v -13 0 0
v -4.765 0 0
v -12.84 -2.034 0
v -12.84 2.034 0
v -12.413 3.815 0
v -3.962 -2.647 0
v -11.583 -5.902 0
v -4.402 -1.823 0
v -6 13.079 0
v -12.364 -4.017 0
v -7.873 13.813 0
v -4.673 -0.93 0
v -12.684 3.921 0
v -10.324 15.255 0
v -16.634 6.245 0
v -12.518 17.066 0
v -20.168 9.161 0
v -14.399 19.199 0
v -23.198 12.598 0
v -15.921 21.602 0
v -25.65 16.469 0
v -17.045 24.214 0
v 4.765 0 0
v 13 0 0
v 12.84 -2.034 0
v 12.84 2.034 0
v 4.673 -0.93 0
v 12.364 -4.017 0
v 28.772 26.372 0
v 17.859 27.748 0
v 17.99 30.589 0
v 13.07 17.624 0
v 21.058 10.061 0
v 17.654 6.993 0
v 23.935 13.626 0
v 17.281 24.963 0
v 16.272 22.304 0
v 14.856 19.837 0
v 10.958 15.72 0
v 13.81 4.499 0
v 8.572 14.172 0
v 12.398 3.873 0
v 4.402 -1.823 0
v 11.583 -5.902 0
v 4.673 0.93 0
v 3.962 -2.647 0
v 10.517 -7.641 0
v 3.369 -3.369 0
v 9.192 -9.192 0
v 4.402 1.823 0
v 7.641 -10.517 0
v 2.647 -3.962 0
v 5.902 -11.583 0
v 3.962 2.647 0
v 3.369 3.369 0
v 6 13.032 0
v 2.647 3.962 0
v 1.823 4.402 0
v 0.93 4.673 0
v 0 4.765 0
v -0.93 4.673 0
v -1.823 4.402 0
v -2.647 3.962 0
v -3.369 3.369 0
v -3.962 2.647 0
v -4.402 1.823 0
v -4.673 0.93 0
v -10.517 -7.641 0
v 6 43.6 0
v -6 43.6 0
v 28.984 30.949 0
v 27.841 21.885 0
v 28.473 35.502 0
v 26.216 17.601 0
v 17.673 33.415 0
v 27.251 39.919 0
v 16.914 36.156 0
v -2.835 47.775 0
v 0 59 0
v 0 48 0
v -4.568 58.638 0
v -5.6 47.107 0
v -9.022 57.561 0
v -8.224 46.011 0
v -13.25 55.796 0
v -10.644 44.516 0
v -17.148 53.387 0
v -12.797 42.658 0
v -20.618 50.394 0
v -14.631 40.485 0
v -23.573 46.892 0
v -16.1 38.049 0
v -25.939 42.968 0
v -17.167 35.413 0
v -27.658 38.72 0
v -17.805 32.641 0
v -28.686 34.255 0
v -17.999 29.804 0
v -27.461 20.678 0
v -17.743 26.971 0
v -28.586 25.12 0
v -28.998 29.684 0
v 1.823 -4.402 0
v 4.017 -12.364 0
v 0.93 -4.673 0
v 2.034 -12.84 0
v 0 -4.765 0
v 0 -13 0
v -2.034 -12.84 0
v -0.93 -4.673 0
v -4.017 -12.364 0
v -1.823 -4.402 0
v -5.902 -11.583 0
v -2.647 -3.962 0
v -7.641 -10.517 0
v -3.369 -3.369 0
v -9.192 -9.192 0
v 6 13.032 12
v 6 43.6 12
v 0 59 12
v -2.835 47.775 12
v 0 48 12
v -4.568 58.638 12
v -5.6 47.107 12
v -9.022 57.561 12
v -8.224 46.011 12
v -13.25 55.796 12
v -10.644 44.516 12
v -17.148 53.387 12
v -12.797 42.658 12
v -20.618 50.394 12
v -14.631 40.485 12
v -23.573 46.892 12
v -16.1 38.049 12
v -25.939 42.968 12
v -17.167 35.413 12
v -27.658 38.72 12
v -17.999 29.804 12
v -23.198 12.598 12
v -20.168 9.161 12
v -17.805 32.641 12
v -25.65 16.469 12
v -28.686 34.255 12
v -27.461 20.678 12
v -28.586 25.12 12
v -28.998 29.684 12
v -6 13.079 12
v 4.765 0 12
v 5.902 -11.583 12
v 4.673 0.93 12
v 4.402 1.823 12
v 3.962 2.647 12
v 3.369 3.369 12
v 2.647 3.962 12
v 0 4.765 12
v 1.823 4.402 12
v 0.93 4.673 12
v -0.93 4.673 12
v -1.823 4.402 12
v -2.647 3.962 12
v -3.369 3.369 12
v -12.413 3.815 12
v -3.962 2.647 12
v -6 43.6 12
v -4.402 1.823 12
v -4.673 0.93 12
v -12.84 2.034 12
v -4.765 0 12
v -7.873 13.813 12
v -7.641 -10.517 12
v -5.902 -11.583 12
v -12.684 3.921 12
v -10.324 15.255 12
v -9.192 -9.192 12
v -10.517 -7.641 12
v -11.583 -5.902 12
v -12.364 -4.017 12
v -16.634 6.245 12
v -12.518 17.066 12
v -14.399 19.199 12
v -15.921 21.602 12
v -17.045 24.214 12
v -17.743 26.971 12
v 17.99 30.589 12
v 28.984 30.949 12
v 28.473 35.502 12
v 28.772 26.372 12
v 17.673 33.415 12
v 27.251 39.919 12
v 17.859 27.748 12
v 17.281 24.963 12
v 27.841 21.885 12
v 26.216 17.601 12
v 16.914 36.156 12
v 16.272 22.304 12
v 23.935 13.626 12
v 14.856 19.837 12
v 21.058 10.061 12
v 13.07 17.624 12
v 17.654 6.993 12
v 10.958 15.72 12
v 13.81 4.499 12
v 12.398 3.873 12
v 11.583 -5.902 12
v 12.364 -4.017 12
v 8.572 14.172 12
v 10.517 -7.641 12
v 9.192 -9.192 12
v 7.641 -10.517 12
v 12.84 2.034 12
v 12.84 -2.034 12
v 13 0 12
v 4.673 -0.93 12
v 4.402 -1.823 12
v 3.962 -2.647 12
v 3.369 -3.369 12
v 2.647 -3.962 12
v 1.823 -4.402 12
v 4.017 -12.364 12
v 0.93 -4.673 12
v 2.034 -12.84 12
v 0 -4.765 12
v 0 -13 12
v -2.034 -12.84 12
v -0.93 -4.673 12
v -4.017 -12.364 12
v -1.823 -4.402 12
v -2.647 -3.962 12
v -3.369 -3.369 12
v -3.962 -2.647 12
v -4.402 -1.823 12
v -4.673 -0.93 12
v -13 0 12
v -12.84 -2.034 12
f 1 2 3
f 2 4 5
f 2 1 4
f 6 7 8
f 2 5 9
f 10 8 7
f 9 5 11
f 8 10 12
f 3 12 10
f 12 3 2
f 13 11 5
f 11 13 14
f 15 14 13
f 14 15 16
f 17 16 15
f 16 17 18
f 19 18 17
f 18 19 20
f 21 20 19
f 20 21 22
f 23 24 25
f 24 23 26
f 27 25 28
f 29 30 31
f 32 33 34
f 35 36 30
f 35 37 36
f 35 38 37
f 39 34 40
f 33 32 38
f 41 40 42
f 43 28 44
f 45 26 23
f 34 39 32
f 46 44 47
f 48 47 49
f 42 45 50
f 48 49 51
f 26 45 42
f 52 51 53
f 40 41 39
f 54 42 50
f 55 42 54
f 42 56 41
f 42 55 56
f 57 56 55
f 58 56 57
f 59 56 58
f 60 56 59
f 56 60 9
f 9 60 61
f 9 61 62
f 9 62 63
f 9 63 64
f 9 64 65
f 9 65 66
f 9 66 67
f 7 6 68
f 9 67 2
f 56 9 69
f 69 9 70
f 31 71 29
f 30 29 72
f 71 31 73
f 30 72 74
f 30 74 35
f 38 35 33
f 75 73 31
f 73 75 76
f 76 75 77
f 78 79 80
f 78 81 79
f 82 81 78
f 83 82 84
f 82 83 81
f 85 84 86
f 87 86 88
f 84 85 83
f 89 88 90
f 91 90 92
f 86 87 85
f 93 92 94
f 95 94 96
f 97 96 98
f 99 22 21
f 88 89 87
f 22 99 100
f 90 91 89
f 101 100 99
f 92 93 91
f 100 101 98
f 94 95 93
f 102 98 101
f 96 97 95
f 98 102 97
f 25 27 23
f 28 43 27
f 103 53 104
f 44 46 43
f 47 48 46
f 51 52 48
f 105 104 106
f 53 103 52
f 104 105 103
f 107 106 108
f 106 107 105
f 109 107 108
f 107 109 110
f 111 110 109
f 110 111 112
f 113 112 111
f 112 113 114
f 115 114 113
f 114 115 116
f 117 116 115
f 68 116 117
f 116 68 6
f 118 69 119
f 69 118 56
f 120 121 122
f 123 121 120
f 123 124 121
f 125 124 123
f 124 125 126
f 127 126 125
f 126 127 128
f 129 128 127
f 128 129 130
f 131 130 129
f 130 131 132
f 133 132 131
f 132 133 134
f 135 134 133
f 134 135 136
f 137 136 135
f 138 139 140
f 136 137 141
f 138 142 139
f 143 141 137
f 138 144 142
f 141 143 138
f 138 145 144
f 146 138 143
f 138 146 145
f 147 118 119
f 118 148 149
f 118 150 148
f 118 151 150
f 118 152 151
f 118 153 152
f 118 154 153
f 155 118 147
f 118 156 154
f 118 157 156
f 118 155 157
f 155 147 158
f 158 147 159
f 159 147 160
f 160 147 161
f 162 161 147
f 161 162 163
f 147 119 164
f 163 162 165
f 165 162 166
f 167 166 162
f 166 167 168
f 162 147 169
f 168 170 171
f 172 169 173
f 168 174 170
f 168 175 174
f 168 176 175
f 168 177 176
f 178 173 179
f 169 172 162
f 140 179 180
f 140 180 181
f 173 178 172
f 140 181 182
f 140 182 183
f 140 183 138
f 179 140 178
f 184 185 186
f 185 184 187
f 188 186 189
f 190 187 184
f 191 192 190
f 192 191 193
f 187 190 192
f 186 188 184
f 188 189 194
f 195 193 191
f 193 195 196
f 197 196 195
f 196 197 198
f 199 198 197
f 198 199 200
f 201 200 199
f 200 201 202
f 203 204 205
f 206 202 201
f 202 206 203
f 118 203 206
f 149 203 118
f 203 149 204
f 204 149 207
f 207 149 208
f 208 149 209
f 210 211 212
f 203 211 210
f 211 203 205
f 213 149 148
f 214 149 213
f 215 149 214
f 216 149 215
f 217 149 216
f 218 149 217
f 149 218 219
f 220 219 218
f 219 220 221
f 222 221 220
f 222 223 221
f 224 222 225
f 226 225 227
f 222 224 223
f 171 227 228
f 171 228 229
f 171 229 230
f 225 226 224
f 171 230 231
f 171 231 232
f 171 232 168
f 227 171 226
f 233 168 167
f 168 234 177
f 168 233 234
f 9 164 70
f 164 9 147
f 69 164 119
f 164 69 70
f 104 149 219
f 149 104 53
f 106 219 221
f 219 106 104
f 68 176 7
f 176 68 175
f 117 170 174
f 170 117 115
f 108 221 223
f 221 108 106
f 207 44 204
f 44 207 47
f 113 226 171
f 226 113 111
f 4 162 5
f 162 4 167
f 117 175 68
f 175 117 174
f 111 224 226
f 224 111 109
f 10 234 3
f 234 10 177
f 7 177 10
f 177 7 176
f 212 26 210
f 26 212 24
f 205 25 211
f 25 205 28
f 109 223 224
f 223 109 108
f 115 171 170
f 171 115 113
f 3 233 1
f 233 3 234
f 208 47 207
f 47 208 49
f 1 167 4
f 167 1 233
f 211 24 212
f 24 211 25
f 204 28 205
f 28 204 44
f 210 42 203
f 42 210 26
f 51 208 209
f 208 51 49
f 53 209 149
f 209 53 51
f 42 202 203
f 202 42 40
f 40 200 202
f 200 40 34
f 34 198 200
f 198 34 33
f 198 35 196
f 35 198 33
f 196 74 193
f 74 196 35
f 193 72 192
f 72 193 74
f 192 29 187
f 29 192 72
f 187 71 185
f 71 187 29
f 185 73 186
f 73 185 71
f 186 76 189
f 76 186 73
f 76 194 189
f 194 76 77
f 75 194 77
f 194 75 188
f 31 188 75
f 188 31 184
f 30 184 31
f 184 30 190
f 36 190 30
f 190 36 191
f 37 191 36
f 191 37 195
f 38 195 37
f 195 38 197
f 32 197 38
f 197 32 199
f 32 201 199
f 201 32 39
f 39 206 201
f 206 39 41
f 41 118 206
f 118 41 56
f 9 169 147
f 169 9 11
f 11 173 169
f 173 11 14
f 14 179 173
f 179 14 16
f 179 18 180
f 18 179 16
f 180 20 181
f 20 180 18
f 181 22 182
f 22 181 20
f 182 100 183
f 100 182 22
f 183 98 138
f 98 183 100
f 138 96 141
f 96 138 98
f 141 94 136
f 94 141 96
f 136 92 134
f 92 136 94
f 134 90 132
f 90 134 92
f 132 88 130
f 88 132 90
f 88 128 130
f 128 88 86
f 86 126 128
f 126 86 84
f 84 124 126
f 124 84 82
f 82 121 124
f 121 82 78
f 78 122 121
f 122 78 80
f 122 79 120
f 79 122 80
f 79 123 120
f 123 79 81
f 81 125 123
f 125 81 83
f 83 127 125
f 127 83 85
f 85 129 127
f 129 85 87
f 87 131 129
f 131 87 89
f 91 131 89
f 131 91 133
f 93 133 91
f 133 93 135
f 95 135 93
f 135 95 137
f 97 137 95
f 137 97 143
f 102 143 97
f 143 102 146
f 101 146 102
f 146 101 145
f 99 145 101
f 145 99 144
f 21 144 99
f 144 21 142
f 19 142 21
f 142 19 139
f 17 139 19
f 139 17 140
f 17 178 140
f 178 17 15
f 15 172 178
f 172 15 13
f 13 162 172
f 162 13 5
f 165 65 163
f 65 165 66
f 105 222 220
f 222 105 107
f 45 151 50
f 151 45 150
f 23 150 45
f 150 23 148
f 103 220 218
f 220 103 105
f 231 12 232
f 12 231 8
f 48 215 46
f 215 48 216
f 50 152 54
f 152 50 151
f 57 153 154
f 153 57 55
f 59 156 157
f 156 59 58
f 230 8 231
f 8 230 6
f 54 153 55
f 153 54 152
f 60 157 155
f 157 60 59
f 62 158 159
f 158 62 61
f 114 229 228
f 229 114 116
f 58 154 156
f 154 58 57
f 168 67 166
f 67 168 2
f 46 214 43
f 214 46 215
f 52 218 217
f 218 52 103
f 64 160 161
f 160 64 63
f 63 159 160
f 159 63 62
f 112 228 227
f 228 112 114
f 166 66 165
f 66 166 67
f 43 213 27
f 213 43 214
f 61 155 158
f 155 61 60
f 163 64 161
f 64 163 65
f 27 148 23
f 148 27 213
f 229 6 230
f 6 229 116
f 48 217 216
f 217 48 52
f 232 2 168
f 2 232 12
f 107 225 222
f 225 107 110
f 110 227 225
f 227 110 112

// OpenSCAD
$fn = 32;

// ----------------------------------------------------------------------
// Hook: 60 mm shank into a 18 mm curl, 12 mm thick
// ----------------------------------------------------------------------

// --- parameters (mm) ---
shank_len = 60;           // shank length from the boss centre
shank_w = 12;             // shank width
boss_d = 26;              // boss diameter
bore_d = 9.53;            // boss bore
curl_in = 18;             // curl inner radius
curl_out = 29;            // curl outer radius
curl_sweep = 290;         // curl sweep angle
hook_t = 12;              // hook thickness

shank_profile = [[-6, 43.6], [6, 43.6], [6, 11], [-6, 11]];
boss_profile = [[13, 0], [12.84, 2.034], [12.364, 4.017], [11.583, 5.902], [10.517, 7.641], [9.192, 9.192], [7.641, 10.517], [5.902, 11.583], [4.017, 12.364], [2.034, 12.84], [0, 13], [-2.034, 12.84], [-4.017, 12.364], [-5.902, 11.583], [-7.641, 10.517], [-9.192, 9.192], [-10.517, 7.641], [-11.583, 5.902], [-12.364, 4.017], [-12.84, 2.034], [-13, 0], [-12.84, -2.034], [-12.364, -4.017], [-11.583, -5.902], [-10.517, -7.641], [-9.192, -9.192], [-7.641, -10.517], [-5.902, -11.583], [-4.017, -12.364], [-2.034, -12.84], [0, -13], [2.034, -12.84], [4.017, -12.364], [5.902, -11.583], [7.641, -10.517], [9.192, -9.192], [10.517, -7.641], [11.583, -5.902], [12.364, -4.017], [12.84, -2.034]];
curl_profile = [[0, 59], [-4.568, 58.638], [-9.022, 57.561], [-13.25, 55.796], [-17.148, 53.387], [-20.618, 50.394], [-23.573, 46.892], [-25.939, 42.968], [-27.658, 38.72], [-28.686, 34.255], [-28.998, 29.684], [-28.586, 25.12], [-27.461, 20.678], [-25.65, 16.469], [-23.198, 12.598], [-20.168, 9.161], [-16.634, 6.245], [-12.684, 3.921], [-8.418, 2.249], [-3.942, 1.269], [0.633, 1.007], [5.191, 1.468], [9.621, 2.642], [13.81, 4.499], [17.654, 6.993], [21.058, 10.061], [23.935, 13.626], [26.216, 17.601], [27.841, 21.885], [28.772, 26.372], [28.984, 30.949], [28.473, 35.502], [27.251, 39.919], [16.914, 36.156], [17.673, 33.415], [17.99, 30.589], [17.859, 27.748], [17.281, 24.963], [16.272, 22.304], [14.856, 19.837], [13.07, 17.624], [10.958, 15.72], [8.572, 14.172], [5.971, 13.019], [3.222, 12.291], [0.393, 12.004], [-2.447, 12.167], [-5.225, 12.775], [-7.873, 13.813], [-10.324, 15.255], [-12.518, 17.066], [-14.399, 19.199], [-15.921, 21.602], [-17.045, 24.214], [-17.743, 26.971], [-17.999, 29.804], [-17.805, 32.641], [-17.167, 35.413], [-16.1, 38.049], [-14.631, 40.485], [-12.797, 42.658], [-10.644, 44.516], [-8.224, 46.011], [-5.6, 47.107], [-2.835, 47.775], [0, 48]];

difference() {
  union() {
    /* three overlapping outlines: shank, boss and the smooth curl */
    linear_extrude(height = hook_t) polygon(shank_profile);
    linear_extrude(height = hook_t) polygon(boss_profile);
    linear_extrude(height = hook_t) polygon(curl_profile);
  }
  translate([0, 0, -2.5]) cylinder(h = hook_t + 5, d = bore_d);
}
